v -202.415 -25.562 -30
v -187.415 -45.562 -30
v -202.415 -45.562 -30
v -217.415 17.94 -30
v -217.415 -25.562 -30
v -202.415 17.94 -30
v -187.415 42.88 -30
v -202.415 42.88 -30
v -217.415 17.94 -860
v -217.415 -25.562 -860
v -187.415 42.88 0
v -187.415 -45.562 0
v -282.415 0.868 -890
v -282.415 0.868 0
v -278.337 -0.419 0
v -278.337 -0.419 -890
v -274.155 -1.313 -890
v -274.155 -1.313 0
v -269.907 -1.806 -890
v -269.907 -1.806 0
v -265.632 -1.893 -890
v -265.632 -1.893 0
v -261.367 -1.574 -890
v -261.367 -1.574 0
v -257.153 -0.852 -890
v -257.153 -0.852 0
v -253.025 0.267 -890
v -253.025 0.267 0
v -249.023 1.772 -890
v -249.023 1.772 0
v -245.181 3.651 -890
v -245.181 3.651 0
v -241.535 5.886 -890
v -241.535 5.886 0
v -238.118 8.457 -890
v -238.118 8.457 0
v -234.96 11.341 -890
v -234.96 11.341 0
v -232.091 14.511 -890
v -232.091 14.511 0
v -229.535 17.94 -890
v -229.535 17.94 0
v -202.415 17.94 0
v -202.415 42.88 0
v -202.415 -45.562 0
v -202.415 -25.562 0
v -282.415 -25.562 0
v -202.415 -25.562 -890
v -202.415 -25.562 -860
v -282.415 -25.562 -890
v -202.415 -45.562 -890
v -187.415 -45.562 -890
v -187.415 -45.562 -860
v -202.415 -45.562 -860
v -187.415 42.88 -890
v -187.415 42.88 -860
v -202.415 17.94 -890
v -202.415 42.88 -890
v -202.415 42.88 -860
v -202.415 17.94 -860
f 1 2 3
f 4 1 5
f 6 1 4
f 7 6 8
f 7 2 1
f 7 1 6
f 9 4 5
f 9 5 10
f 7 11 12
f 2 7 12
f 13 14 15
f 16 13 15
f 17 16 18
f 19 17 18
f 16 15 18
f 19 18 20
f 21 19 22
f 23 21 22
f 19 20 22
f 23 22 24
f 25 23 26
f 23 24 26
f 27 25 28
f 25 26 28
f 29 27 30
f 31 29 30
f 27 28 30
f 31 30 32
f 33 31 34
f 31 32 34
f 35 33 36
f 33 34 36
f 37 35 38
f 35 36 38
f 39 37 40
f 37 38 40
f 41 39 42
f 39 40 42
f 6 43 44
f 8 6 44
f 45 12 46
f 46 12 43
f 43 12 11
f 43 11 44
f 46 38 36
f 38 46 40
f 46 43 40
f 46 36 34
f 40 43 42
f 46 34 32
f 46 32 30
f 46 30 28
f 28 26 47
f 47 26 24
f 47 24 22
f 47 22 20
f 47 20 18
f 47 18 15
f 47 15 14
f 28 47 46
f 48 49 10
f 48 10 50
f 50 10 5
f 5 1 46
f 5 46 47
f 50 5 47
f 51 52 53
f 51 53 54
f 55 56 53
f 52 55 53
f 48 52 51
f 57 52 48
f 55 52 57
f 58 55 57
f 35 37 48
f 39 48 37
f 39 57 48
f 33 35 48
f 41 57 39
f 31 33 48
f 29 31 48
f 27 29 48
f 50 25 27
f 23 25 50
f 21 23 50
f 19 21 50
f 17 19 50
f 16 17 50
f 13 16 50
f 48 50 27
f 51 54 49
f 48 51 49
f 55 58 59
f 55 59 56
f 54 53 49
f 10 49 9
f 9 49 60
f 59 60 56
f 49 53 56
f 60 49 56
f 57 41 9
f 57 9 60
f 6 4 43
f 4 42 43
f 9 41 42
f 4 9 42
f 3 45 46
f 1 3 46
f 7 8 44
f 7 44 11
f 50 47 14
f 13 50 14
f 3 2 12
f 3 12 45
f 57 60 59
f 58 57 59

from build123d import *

# Parameters (mm, degrees)
BOSS_EXTRUDE1_DEPTH = 890
SKETCH4_W           = 830
SKETCH4_H           = 88.442264386
CUT_EXTRUDE1_DEPTH  = 30


with BuildPart() as part:
    # Sketch1 → Boss-Extrude1 (new body)
    with BuildSketch(Plane.XY):
        with BuildLine():
            ThreePointArc((-282.415201489, 0.868106525), (-253.025149144, 0.266679613), (-229.534634399, 17.939613952))
            Line((-229.534634399, 17.939613952), (-202.415201489, 17.939613952))
            Line((-202.415201489, 17.939613952), (-202.415201489, 42.879994244))
            Line((-202.415201489, 42.879994244), (-187.415201489, 42.879994244))
            Line((-187.415201489, 42.879994244), (-187.415201489, -45.562270142))
            Line((-187.415201489, -45.562270142), (-202.415201489, -45.562270142))
            Line((-202.415201489, -45.562270142), (-202.415201489, -25.562270142))
            Line((-202.415201489, -25.562270142), (-282.415201489, -25.562270142))
            Line((-282.415201489, -25.562270142), (-282.415201489, 0.868106525))
        make_face()
    extrude(amount=-BOSS_EXTRUDE1_DEPTH)

    # Sketch4 → Cut-Extrude1 (cut)
    with BuildSketch(Plane(origin=(-187.415201489, 0, 0), x_dir=(0, 0, -1), z_dir=(1, 0, 0))):
        with Locations((445, -1.341137949)):
            Rectangle(SKETCH4_W, SKETCH4_H)
    extrude(amount=-CUT_EXTRUDE1_DEPTH, mode=Mode.SUBTRACT)


solid = part.part
